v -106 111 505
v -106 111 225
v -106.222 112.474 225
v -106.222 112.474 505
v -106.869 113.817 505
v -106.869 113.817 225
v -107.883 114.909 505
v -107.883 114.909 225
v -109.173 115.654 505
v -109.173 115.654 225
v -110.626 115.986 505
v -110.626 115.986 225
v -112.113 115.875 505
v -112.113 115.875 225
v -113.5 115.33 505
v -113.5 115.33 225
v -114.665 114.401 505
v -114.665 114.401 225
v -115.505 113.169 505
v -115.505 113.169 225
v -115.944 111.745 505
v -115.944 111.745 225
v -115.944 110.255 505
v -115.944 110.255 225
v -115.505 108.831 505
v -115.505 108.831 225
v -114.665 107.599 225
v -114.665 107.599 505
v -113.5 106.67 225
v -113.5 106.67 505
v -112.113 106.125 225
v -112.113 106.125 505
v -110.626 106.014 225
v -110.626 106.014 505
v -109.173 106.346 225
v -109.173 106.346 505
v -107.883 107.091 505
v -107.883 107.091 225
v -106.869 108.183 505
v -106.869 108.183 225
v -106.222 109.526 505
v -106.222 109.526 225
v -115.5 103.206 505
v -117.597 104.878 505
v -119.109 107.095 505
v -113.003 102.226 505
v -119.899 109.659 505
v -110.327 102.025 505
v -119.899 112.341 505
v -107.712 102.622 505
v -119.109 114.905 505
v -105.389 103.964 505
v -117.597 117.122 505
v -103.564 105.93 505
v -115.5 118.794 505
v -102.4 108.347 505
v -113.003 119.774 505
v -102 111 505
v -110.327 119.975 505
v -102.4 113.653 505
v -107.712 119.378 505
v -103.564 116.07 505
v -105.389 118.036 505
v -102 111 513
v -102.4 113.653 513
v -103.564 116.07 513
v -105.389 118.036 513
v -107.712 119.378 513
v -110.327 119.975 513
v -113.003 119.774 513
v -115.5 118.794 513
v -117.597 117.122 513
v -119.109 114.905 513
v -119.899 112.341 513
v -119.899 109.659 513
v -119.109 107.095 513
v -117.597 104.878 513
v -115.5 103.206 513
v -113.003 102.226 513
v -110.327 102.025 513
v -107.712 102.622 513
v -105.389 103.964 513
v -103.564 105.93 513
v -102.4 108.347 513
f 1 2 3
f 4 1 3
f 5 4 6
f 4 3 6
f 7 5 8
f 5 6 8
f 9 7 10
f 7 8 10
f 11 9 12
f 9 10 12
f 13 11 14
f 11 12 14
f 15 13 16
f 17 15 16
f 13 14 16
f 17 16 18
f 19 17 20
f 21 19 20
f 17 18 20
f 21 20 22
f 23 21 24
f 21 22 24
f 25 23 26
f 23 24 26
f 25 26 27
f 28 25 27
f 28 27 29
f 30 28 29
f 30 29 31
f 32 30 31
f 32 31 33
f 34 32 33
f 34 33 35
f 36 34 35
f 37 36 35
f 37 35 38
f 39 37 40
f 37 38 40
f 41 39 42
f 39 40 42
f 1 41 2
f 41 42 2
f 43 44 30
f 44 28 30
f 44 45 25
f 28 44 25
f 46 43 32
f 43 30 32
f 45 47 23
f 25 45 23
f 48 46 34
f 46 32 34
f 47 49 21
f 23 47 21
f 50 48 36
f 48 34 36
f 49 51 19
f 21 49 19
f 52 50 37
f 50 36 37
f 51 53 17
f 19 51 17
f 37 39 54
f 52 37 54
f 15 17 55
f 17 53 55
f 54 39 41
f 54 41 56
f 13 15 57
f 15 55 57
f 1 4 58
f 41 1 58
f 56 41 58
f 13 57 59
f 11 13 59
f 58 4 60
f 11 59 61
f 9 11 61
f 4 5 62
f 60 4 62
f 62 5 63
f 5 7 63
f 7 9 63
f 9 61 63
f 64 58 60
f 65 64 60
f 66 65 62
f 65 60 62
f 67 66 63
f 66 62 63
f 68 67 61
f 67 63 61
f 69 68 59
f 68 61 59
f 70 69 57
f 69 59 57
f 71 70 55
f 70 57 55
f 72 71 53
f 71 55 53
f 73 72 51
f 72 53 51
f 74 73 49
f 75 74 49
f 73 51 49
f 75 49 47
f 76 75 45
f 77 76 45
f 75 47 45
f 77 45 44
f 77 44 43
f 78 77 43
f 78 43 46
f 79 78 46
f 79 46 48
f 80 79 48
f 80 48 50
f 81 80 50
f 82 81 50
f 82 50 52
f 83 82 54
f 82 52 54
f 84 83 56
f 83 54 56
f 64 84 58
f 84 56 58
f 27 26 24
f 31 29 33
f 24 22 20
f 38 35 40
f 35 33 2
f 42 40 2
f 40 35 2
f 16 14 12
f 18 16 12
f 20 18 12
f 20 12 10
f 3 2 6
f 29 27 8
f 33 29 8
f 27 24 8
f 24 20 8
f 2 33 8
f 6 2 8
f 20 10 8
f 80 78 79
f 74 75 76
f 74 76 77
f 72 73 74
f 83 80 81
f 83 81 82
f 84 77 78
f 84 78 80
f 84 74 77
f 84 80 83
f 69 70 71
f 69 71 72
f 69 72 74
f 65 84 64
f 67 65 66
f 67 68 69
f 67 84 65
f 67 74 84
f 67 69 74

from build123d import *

# Parameters (mm, degrees)
EXTRUDE_START      = 225
EXTRUDE_SKETCH_1_R = 5
EXTRUDE_1_DEPTH    = 280
EXTRUDE_START_2    = 505
EXTRUDE_SKETCH_2_R = 9
EXTRUDE_2_DEPTH    = 8


with BuildPart() as part:
    # Extrude sketch 1 → Extrude 1 (new body)
    with BuildSketch(Plane.XY.offset(EXTRUDE_START)):
        with Locations((-111, 111)):
            Circle(EXTRUDE_SKETCH_1_R)
    extrude(amount=EXTRUDE_1_DEPTH)


with BuildPart() as body_2:
    # Extrude sketch 2 → Extrude 2 (new body)
    with BuildSketch(Plane.XY.offset(EXTRUDE_START_2)):
        with Locations((-111, 111)):
            Circle(EXTRUDE_SKETCH_2_R)
    extrude(amount=EXTRUDE_2_DEPTH)

    # Combine (weld / assembly of features): union part
    add(part.part)


solid = body_2.part
